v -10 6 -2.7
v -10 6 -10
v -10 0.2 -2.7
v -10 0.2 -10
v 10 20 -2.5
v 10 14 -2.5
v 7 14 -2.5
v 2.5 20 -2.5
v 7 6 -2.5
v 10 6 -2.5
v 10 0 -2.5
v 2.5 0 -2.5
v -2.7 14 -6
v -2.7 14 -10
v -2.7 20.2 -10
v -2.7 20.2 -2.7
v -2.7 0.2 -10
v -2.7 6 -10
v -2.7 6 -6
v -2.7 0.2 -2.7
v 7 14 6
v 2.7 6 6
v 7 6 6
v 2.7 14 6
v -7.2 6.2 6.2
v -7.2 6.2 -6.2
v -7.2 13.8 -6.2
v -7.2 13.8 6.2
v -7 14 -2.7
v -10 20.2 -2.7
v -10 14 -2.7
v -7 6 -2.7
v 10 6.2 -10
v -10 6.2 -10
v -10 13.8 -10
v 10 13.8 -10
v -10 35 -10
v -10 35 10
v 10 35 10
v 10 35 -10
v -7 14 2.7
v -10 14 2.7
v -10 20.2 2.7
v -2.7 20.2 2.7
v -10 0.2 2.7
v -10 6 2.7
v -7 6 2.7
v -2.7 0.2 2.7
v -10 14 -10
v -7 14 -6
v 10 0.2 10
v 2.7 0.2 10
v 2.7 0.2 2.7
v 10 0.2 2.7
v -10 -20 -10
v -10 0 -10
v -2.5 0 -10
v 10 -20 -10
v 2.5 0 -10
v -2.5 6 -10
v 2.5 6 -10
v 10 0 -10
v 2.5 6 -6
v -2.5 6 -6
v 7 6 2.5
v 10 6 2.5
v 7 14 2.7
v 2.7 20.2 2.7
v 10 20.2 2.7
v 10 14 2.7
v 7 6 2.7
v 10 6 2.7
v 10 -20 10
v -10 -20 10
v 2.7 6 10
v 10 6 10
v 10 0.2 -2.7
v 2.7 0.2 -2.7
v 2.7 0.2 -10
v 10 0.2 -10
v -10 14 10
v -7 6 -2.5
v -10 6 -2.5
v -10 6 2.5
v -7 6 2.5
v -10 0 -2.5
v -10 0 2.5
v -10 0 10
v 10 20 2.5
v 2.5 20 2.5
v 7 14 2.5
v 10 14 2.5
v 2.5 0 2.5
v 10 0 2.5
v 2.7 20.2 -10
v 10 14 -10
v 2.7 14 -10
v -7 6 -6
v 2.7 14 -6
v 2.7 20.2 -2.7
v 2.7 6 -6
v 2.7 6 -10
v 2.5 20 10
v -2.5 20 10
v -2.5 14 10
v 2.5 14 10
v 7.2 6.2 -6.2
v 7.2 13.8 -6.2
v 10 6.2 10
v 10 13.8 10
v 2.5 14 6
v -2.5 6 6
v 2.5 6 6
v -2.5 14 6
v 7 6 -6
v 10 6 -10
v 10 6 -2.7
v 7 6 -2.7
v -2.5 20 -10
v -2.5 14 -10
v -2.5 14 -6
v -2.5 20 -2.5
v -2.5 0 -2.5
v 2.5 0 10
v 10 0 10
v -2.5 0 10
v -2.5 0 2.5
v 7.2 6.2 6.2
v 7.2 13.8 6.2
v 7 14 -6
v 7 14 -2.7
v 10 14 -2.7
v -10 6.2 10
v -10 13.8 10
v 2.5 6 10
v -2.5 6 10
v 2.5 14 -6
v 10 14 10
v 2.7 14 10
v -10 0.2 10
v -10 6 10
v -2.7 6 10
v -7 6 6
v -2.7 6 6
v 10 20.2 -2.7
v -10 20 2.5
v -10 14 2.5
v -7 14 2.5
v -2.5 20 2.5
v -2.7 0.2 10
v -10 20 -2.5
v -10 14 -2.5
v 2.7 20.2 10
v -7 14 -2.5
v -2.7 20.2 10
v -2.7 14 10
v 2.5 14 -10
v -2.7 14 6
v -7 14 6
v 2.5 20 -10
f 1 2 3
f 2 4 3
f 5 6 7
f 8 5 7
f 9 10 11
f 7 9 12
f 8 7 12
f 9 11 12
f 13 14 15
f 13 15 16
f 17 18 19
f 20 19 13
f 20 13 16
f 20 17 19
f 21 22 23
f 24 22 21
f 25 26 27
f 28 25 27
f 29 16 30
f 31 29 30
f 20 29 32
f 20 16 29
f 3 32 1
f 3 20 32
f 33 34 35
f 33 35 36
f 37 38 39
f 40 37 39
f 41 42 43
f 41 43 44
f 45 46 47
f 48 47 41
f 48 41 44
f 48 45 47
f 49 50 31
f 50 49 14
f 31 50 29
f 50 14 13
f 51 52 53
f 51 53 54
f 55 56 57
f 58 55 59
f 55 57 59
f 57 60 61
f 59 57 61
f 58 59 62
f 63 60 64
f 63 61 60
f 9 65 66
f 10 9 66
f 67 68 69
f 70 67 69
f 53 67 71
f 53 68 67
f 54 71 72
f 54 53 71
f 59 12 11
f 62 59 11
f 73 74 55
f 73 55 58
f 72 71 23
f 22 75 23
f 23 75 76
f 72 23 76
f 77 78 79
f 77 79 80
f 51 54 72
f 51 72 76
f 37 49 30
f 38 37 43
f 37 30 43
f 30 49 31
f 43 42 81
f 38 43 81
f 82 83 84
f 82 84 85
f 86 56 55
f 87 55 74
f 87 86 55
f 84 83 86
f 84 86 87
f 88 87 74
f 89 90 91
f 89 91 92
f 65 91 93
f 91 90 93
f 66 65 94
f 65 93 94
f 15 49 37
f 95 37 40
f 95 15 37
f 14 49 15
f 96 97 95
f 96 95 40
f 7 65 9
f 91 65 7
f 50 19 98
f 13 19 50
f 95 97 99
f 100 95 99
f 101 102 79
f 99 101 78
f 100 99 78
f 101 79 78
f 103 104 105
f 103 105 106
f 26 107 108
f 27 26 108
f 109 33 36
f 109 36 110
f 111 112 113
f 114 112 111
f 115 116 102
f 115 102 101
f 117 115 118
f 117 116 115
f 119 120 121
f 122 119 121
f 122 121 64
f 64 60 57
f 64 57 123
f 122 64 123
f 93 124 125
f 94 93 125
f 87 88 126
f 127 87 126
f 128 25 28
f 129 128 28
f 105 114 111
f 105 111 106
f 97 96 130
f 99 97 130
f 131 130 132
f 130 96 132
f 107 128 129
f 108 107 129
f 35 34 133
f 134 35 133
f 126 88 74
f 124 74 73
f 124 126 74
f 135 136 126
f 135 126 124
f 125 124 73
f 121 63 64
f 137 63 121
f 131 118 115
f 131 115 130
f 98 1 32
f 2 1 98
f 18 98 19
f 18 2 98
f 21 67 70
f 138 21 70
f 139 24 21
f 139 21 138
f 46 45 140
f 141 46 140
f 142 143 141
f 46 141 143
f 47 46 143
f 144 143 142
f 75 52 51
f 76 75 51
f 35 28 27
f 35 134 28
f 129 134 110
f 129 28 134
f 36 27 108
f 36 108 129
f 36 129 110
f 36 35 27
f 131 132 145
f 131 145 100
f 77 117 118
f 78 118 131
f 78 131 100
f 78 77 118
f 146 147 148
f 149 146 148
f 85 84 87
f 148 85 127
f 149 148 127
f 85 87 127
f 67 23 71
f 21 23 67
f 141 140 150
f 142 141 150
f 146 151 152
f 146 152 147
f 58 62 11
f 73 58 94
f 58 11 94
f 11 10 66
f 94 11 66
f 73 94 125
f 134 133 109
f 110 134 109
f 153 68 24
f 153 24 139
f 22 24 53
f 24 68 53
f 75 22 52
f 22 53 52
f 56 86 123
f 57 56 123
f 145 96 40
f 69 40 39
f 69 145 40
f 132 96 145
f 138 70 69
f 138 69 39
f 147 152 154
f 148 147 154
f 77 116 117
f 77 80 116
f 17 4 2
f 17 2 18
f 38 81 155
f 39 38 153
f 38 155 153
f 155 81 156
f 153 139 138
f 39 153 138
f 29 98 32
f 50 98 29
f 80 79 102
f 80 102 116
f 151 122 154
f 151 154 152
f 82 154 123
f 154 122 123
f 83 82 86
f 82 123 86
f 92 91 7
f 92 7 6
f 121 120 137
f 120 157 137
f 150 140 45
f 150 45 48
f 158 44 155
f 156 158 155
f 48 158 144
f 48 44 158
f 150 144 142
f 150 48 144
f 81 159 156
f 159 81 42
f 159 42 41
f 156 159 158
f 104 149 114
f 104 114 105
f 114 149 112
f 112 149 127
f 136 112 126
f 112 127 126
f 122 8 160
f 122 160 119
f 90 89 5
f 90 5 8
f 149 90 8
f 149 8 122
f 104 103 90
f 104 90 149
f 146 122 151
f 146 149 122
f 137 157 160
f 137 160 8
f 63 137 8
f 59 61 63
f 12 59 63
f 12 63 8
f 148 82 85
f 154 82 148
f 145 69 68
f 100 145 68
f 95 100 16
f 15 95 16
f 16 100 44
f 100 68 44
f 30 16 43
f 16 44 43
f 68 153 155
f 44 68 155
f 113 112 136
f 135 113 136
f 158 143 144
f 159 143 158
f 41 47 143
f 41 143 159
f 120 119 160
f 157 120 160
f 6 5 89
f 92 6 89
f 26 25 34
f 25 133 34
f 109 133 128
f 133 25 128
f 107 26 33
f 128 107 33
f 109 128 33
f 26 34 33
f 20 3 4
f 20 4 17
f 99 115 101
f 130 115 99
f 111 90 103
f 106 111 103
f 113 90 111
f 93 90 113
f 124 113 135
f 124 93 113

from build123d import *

# Parameters (mm, degrees)
F0_W       = 20
F0_H       = 20
F1_DEPTH   = 20
F2_W       = 5
F2_H       = 7.5
F2_W_2     = 7.5
F2_H_2     = 5
F3_DEPTH   = 20
F4_W       = 20
F4_H       = 20
F5_DEPTH   = 35
F6_OFFSET  = 0.2
F7_W       = 8
F7_H       = 8
F8_DEPTH   = 50
F9_W       = 3
F9_H       = 8
F10_DEPTH  = 50
F12_W      = 20
F12_H      = 20
F13_DEPTH  = 8
F14_OFFSET = 0.2


with BuildPart() as f1:
    # F0 (on Front) → F1 (new body)
    with BuildSketch(Plane.XZ):
        Rectangle(F0_W, F0_H)
    extrude(amount=F1_DEPTH)

    # F2 (on face) → F3 (join)
    with BuildSketch(Plane(origin=(0, 0, 0), x_dir=(-1, 0, 0), z_dir=(0, 1, 0))):
        with Locations((0, -6.25)):
            Rectangle(F2_W, F2_H)
        with Locations((-6.25, 0)):
            Rectangle(F2_W_2, F2_H_2)
        Rectangle(F2_W, F2_H_2)
        with Locations((6.25, 0)):
            Rectangle(F2_W_2, F2_H_2)
        with Locations((0, 6.25)):
            Rectangle(F2_W, F2_H)
    extrude(amount=F3_DEPTH)


with BuildPart() as f5:
    # F4 (on Front) → F5 (new body)
    with BuildSketch(Plane.XZ):
        Rectangle(F4_W, F4_H)
    extrude(amount=-F5_DEPTH)

    # F6: cut F1, made larger all round first
    f6_tool = offset(f1.part, amount=F6_OFFSET, kind=Kind.INTERSECTION, mode=Mode.PRIVATE)
    add(f6_tool, mode=Mode.SUBTRACT)


with BuildPart() as f8_tool:
    # F7 (on Right) → F8 (new body, symmetric)
    with BuildSketch(Plane.YZ):
        with Locations((10, 10)):
            Rectangle(F7_W, F7_H)
        with Locations((10, -10)):
            Rectangle(F7_W, F7_H)
    extrude(amount=F8_DEPTH, both=True)


with BuildPart() as f1_1:
    add(f1.part)

    # F8: cut by f8_tool
    add(f8_tool.part, mode=Mode.SUBTRACT)


with BuildPart() as f5_1:
    add(f5.part)

    # F8: cut by f8_tool
    add(f8_tool.part, mode=Mode.SUBTRACT)


with BuildPart() as f10_tool:
    # F9 (on Top) → F10 (new body, symmetric)
    with BuildSketch(Plane.XY):
        with Locations((-8.5, 10)):
            Rectangle(F9_W, F9_H)
        with Locations((8.5, 10)):
            Rectangle(F9_W, F9_H)
    extrude(amount=F10_DEPTH, both=True)


with BuildPart() as f1_2:
    add(f1_1.part)

    # F10: cut by f10_tool
    add(f10_tool.part, mode=Mode.SUBTRACT)


with BuildPart() as f5_2:
    add(f5_1.part)

    # F10: cut by f10_tool
    add(f10_tool.part, mode=Mode.SUBTRACT)


with BuildPart() as f13:
    # F12 (on plane+point) → F13 (new body, through all)
    with BuildSketch(Plane.XZ.offset(-6)):
        Rectangle(F12_W, F12_H)
    extrude(amount=-F13_DEPTH)

    # F14: cut F1, F5, each made larger all round first
    f14_tool = offset(f1_2.part, amount=F14_OFFSET, kind=Kind.INTERSECTION, mode=Mode.PRIVATE)
    add(f14_tool, mode=Mode.SUBTRACT)
    f14_tool1 = offset(f5_2.part, amount=F14_OFFSET, kind=Kind.INTERSECTION, mode=Mode.PRIVATE)
    add(f14_tool1, mode=Mode.SUBTRACT)


solid = Compound([f1_2.part, f5_2.part, f13.part])
